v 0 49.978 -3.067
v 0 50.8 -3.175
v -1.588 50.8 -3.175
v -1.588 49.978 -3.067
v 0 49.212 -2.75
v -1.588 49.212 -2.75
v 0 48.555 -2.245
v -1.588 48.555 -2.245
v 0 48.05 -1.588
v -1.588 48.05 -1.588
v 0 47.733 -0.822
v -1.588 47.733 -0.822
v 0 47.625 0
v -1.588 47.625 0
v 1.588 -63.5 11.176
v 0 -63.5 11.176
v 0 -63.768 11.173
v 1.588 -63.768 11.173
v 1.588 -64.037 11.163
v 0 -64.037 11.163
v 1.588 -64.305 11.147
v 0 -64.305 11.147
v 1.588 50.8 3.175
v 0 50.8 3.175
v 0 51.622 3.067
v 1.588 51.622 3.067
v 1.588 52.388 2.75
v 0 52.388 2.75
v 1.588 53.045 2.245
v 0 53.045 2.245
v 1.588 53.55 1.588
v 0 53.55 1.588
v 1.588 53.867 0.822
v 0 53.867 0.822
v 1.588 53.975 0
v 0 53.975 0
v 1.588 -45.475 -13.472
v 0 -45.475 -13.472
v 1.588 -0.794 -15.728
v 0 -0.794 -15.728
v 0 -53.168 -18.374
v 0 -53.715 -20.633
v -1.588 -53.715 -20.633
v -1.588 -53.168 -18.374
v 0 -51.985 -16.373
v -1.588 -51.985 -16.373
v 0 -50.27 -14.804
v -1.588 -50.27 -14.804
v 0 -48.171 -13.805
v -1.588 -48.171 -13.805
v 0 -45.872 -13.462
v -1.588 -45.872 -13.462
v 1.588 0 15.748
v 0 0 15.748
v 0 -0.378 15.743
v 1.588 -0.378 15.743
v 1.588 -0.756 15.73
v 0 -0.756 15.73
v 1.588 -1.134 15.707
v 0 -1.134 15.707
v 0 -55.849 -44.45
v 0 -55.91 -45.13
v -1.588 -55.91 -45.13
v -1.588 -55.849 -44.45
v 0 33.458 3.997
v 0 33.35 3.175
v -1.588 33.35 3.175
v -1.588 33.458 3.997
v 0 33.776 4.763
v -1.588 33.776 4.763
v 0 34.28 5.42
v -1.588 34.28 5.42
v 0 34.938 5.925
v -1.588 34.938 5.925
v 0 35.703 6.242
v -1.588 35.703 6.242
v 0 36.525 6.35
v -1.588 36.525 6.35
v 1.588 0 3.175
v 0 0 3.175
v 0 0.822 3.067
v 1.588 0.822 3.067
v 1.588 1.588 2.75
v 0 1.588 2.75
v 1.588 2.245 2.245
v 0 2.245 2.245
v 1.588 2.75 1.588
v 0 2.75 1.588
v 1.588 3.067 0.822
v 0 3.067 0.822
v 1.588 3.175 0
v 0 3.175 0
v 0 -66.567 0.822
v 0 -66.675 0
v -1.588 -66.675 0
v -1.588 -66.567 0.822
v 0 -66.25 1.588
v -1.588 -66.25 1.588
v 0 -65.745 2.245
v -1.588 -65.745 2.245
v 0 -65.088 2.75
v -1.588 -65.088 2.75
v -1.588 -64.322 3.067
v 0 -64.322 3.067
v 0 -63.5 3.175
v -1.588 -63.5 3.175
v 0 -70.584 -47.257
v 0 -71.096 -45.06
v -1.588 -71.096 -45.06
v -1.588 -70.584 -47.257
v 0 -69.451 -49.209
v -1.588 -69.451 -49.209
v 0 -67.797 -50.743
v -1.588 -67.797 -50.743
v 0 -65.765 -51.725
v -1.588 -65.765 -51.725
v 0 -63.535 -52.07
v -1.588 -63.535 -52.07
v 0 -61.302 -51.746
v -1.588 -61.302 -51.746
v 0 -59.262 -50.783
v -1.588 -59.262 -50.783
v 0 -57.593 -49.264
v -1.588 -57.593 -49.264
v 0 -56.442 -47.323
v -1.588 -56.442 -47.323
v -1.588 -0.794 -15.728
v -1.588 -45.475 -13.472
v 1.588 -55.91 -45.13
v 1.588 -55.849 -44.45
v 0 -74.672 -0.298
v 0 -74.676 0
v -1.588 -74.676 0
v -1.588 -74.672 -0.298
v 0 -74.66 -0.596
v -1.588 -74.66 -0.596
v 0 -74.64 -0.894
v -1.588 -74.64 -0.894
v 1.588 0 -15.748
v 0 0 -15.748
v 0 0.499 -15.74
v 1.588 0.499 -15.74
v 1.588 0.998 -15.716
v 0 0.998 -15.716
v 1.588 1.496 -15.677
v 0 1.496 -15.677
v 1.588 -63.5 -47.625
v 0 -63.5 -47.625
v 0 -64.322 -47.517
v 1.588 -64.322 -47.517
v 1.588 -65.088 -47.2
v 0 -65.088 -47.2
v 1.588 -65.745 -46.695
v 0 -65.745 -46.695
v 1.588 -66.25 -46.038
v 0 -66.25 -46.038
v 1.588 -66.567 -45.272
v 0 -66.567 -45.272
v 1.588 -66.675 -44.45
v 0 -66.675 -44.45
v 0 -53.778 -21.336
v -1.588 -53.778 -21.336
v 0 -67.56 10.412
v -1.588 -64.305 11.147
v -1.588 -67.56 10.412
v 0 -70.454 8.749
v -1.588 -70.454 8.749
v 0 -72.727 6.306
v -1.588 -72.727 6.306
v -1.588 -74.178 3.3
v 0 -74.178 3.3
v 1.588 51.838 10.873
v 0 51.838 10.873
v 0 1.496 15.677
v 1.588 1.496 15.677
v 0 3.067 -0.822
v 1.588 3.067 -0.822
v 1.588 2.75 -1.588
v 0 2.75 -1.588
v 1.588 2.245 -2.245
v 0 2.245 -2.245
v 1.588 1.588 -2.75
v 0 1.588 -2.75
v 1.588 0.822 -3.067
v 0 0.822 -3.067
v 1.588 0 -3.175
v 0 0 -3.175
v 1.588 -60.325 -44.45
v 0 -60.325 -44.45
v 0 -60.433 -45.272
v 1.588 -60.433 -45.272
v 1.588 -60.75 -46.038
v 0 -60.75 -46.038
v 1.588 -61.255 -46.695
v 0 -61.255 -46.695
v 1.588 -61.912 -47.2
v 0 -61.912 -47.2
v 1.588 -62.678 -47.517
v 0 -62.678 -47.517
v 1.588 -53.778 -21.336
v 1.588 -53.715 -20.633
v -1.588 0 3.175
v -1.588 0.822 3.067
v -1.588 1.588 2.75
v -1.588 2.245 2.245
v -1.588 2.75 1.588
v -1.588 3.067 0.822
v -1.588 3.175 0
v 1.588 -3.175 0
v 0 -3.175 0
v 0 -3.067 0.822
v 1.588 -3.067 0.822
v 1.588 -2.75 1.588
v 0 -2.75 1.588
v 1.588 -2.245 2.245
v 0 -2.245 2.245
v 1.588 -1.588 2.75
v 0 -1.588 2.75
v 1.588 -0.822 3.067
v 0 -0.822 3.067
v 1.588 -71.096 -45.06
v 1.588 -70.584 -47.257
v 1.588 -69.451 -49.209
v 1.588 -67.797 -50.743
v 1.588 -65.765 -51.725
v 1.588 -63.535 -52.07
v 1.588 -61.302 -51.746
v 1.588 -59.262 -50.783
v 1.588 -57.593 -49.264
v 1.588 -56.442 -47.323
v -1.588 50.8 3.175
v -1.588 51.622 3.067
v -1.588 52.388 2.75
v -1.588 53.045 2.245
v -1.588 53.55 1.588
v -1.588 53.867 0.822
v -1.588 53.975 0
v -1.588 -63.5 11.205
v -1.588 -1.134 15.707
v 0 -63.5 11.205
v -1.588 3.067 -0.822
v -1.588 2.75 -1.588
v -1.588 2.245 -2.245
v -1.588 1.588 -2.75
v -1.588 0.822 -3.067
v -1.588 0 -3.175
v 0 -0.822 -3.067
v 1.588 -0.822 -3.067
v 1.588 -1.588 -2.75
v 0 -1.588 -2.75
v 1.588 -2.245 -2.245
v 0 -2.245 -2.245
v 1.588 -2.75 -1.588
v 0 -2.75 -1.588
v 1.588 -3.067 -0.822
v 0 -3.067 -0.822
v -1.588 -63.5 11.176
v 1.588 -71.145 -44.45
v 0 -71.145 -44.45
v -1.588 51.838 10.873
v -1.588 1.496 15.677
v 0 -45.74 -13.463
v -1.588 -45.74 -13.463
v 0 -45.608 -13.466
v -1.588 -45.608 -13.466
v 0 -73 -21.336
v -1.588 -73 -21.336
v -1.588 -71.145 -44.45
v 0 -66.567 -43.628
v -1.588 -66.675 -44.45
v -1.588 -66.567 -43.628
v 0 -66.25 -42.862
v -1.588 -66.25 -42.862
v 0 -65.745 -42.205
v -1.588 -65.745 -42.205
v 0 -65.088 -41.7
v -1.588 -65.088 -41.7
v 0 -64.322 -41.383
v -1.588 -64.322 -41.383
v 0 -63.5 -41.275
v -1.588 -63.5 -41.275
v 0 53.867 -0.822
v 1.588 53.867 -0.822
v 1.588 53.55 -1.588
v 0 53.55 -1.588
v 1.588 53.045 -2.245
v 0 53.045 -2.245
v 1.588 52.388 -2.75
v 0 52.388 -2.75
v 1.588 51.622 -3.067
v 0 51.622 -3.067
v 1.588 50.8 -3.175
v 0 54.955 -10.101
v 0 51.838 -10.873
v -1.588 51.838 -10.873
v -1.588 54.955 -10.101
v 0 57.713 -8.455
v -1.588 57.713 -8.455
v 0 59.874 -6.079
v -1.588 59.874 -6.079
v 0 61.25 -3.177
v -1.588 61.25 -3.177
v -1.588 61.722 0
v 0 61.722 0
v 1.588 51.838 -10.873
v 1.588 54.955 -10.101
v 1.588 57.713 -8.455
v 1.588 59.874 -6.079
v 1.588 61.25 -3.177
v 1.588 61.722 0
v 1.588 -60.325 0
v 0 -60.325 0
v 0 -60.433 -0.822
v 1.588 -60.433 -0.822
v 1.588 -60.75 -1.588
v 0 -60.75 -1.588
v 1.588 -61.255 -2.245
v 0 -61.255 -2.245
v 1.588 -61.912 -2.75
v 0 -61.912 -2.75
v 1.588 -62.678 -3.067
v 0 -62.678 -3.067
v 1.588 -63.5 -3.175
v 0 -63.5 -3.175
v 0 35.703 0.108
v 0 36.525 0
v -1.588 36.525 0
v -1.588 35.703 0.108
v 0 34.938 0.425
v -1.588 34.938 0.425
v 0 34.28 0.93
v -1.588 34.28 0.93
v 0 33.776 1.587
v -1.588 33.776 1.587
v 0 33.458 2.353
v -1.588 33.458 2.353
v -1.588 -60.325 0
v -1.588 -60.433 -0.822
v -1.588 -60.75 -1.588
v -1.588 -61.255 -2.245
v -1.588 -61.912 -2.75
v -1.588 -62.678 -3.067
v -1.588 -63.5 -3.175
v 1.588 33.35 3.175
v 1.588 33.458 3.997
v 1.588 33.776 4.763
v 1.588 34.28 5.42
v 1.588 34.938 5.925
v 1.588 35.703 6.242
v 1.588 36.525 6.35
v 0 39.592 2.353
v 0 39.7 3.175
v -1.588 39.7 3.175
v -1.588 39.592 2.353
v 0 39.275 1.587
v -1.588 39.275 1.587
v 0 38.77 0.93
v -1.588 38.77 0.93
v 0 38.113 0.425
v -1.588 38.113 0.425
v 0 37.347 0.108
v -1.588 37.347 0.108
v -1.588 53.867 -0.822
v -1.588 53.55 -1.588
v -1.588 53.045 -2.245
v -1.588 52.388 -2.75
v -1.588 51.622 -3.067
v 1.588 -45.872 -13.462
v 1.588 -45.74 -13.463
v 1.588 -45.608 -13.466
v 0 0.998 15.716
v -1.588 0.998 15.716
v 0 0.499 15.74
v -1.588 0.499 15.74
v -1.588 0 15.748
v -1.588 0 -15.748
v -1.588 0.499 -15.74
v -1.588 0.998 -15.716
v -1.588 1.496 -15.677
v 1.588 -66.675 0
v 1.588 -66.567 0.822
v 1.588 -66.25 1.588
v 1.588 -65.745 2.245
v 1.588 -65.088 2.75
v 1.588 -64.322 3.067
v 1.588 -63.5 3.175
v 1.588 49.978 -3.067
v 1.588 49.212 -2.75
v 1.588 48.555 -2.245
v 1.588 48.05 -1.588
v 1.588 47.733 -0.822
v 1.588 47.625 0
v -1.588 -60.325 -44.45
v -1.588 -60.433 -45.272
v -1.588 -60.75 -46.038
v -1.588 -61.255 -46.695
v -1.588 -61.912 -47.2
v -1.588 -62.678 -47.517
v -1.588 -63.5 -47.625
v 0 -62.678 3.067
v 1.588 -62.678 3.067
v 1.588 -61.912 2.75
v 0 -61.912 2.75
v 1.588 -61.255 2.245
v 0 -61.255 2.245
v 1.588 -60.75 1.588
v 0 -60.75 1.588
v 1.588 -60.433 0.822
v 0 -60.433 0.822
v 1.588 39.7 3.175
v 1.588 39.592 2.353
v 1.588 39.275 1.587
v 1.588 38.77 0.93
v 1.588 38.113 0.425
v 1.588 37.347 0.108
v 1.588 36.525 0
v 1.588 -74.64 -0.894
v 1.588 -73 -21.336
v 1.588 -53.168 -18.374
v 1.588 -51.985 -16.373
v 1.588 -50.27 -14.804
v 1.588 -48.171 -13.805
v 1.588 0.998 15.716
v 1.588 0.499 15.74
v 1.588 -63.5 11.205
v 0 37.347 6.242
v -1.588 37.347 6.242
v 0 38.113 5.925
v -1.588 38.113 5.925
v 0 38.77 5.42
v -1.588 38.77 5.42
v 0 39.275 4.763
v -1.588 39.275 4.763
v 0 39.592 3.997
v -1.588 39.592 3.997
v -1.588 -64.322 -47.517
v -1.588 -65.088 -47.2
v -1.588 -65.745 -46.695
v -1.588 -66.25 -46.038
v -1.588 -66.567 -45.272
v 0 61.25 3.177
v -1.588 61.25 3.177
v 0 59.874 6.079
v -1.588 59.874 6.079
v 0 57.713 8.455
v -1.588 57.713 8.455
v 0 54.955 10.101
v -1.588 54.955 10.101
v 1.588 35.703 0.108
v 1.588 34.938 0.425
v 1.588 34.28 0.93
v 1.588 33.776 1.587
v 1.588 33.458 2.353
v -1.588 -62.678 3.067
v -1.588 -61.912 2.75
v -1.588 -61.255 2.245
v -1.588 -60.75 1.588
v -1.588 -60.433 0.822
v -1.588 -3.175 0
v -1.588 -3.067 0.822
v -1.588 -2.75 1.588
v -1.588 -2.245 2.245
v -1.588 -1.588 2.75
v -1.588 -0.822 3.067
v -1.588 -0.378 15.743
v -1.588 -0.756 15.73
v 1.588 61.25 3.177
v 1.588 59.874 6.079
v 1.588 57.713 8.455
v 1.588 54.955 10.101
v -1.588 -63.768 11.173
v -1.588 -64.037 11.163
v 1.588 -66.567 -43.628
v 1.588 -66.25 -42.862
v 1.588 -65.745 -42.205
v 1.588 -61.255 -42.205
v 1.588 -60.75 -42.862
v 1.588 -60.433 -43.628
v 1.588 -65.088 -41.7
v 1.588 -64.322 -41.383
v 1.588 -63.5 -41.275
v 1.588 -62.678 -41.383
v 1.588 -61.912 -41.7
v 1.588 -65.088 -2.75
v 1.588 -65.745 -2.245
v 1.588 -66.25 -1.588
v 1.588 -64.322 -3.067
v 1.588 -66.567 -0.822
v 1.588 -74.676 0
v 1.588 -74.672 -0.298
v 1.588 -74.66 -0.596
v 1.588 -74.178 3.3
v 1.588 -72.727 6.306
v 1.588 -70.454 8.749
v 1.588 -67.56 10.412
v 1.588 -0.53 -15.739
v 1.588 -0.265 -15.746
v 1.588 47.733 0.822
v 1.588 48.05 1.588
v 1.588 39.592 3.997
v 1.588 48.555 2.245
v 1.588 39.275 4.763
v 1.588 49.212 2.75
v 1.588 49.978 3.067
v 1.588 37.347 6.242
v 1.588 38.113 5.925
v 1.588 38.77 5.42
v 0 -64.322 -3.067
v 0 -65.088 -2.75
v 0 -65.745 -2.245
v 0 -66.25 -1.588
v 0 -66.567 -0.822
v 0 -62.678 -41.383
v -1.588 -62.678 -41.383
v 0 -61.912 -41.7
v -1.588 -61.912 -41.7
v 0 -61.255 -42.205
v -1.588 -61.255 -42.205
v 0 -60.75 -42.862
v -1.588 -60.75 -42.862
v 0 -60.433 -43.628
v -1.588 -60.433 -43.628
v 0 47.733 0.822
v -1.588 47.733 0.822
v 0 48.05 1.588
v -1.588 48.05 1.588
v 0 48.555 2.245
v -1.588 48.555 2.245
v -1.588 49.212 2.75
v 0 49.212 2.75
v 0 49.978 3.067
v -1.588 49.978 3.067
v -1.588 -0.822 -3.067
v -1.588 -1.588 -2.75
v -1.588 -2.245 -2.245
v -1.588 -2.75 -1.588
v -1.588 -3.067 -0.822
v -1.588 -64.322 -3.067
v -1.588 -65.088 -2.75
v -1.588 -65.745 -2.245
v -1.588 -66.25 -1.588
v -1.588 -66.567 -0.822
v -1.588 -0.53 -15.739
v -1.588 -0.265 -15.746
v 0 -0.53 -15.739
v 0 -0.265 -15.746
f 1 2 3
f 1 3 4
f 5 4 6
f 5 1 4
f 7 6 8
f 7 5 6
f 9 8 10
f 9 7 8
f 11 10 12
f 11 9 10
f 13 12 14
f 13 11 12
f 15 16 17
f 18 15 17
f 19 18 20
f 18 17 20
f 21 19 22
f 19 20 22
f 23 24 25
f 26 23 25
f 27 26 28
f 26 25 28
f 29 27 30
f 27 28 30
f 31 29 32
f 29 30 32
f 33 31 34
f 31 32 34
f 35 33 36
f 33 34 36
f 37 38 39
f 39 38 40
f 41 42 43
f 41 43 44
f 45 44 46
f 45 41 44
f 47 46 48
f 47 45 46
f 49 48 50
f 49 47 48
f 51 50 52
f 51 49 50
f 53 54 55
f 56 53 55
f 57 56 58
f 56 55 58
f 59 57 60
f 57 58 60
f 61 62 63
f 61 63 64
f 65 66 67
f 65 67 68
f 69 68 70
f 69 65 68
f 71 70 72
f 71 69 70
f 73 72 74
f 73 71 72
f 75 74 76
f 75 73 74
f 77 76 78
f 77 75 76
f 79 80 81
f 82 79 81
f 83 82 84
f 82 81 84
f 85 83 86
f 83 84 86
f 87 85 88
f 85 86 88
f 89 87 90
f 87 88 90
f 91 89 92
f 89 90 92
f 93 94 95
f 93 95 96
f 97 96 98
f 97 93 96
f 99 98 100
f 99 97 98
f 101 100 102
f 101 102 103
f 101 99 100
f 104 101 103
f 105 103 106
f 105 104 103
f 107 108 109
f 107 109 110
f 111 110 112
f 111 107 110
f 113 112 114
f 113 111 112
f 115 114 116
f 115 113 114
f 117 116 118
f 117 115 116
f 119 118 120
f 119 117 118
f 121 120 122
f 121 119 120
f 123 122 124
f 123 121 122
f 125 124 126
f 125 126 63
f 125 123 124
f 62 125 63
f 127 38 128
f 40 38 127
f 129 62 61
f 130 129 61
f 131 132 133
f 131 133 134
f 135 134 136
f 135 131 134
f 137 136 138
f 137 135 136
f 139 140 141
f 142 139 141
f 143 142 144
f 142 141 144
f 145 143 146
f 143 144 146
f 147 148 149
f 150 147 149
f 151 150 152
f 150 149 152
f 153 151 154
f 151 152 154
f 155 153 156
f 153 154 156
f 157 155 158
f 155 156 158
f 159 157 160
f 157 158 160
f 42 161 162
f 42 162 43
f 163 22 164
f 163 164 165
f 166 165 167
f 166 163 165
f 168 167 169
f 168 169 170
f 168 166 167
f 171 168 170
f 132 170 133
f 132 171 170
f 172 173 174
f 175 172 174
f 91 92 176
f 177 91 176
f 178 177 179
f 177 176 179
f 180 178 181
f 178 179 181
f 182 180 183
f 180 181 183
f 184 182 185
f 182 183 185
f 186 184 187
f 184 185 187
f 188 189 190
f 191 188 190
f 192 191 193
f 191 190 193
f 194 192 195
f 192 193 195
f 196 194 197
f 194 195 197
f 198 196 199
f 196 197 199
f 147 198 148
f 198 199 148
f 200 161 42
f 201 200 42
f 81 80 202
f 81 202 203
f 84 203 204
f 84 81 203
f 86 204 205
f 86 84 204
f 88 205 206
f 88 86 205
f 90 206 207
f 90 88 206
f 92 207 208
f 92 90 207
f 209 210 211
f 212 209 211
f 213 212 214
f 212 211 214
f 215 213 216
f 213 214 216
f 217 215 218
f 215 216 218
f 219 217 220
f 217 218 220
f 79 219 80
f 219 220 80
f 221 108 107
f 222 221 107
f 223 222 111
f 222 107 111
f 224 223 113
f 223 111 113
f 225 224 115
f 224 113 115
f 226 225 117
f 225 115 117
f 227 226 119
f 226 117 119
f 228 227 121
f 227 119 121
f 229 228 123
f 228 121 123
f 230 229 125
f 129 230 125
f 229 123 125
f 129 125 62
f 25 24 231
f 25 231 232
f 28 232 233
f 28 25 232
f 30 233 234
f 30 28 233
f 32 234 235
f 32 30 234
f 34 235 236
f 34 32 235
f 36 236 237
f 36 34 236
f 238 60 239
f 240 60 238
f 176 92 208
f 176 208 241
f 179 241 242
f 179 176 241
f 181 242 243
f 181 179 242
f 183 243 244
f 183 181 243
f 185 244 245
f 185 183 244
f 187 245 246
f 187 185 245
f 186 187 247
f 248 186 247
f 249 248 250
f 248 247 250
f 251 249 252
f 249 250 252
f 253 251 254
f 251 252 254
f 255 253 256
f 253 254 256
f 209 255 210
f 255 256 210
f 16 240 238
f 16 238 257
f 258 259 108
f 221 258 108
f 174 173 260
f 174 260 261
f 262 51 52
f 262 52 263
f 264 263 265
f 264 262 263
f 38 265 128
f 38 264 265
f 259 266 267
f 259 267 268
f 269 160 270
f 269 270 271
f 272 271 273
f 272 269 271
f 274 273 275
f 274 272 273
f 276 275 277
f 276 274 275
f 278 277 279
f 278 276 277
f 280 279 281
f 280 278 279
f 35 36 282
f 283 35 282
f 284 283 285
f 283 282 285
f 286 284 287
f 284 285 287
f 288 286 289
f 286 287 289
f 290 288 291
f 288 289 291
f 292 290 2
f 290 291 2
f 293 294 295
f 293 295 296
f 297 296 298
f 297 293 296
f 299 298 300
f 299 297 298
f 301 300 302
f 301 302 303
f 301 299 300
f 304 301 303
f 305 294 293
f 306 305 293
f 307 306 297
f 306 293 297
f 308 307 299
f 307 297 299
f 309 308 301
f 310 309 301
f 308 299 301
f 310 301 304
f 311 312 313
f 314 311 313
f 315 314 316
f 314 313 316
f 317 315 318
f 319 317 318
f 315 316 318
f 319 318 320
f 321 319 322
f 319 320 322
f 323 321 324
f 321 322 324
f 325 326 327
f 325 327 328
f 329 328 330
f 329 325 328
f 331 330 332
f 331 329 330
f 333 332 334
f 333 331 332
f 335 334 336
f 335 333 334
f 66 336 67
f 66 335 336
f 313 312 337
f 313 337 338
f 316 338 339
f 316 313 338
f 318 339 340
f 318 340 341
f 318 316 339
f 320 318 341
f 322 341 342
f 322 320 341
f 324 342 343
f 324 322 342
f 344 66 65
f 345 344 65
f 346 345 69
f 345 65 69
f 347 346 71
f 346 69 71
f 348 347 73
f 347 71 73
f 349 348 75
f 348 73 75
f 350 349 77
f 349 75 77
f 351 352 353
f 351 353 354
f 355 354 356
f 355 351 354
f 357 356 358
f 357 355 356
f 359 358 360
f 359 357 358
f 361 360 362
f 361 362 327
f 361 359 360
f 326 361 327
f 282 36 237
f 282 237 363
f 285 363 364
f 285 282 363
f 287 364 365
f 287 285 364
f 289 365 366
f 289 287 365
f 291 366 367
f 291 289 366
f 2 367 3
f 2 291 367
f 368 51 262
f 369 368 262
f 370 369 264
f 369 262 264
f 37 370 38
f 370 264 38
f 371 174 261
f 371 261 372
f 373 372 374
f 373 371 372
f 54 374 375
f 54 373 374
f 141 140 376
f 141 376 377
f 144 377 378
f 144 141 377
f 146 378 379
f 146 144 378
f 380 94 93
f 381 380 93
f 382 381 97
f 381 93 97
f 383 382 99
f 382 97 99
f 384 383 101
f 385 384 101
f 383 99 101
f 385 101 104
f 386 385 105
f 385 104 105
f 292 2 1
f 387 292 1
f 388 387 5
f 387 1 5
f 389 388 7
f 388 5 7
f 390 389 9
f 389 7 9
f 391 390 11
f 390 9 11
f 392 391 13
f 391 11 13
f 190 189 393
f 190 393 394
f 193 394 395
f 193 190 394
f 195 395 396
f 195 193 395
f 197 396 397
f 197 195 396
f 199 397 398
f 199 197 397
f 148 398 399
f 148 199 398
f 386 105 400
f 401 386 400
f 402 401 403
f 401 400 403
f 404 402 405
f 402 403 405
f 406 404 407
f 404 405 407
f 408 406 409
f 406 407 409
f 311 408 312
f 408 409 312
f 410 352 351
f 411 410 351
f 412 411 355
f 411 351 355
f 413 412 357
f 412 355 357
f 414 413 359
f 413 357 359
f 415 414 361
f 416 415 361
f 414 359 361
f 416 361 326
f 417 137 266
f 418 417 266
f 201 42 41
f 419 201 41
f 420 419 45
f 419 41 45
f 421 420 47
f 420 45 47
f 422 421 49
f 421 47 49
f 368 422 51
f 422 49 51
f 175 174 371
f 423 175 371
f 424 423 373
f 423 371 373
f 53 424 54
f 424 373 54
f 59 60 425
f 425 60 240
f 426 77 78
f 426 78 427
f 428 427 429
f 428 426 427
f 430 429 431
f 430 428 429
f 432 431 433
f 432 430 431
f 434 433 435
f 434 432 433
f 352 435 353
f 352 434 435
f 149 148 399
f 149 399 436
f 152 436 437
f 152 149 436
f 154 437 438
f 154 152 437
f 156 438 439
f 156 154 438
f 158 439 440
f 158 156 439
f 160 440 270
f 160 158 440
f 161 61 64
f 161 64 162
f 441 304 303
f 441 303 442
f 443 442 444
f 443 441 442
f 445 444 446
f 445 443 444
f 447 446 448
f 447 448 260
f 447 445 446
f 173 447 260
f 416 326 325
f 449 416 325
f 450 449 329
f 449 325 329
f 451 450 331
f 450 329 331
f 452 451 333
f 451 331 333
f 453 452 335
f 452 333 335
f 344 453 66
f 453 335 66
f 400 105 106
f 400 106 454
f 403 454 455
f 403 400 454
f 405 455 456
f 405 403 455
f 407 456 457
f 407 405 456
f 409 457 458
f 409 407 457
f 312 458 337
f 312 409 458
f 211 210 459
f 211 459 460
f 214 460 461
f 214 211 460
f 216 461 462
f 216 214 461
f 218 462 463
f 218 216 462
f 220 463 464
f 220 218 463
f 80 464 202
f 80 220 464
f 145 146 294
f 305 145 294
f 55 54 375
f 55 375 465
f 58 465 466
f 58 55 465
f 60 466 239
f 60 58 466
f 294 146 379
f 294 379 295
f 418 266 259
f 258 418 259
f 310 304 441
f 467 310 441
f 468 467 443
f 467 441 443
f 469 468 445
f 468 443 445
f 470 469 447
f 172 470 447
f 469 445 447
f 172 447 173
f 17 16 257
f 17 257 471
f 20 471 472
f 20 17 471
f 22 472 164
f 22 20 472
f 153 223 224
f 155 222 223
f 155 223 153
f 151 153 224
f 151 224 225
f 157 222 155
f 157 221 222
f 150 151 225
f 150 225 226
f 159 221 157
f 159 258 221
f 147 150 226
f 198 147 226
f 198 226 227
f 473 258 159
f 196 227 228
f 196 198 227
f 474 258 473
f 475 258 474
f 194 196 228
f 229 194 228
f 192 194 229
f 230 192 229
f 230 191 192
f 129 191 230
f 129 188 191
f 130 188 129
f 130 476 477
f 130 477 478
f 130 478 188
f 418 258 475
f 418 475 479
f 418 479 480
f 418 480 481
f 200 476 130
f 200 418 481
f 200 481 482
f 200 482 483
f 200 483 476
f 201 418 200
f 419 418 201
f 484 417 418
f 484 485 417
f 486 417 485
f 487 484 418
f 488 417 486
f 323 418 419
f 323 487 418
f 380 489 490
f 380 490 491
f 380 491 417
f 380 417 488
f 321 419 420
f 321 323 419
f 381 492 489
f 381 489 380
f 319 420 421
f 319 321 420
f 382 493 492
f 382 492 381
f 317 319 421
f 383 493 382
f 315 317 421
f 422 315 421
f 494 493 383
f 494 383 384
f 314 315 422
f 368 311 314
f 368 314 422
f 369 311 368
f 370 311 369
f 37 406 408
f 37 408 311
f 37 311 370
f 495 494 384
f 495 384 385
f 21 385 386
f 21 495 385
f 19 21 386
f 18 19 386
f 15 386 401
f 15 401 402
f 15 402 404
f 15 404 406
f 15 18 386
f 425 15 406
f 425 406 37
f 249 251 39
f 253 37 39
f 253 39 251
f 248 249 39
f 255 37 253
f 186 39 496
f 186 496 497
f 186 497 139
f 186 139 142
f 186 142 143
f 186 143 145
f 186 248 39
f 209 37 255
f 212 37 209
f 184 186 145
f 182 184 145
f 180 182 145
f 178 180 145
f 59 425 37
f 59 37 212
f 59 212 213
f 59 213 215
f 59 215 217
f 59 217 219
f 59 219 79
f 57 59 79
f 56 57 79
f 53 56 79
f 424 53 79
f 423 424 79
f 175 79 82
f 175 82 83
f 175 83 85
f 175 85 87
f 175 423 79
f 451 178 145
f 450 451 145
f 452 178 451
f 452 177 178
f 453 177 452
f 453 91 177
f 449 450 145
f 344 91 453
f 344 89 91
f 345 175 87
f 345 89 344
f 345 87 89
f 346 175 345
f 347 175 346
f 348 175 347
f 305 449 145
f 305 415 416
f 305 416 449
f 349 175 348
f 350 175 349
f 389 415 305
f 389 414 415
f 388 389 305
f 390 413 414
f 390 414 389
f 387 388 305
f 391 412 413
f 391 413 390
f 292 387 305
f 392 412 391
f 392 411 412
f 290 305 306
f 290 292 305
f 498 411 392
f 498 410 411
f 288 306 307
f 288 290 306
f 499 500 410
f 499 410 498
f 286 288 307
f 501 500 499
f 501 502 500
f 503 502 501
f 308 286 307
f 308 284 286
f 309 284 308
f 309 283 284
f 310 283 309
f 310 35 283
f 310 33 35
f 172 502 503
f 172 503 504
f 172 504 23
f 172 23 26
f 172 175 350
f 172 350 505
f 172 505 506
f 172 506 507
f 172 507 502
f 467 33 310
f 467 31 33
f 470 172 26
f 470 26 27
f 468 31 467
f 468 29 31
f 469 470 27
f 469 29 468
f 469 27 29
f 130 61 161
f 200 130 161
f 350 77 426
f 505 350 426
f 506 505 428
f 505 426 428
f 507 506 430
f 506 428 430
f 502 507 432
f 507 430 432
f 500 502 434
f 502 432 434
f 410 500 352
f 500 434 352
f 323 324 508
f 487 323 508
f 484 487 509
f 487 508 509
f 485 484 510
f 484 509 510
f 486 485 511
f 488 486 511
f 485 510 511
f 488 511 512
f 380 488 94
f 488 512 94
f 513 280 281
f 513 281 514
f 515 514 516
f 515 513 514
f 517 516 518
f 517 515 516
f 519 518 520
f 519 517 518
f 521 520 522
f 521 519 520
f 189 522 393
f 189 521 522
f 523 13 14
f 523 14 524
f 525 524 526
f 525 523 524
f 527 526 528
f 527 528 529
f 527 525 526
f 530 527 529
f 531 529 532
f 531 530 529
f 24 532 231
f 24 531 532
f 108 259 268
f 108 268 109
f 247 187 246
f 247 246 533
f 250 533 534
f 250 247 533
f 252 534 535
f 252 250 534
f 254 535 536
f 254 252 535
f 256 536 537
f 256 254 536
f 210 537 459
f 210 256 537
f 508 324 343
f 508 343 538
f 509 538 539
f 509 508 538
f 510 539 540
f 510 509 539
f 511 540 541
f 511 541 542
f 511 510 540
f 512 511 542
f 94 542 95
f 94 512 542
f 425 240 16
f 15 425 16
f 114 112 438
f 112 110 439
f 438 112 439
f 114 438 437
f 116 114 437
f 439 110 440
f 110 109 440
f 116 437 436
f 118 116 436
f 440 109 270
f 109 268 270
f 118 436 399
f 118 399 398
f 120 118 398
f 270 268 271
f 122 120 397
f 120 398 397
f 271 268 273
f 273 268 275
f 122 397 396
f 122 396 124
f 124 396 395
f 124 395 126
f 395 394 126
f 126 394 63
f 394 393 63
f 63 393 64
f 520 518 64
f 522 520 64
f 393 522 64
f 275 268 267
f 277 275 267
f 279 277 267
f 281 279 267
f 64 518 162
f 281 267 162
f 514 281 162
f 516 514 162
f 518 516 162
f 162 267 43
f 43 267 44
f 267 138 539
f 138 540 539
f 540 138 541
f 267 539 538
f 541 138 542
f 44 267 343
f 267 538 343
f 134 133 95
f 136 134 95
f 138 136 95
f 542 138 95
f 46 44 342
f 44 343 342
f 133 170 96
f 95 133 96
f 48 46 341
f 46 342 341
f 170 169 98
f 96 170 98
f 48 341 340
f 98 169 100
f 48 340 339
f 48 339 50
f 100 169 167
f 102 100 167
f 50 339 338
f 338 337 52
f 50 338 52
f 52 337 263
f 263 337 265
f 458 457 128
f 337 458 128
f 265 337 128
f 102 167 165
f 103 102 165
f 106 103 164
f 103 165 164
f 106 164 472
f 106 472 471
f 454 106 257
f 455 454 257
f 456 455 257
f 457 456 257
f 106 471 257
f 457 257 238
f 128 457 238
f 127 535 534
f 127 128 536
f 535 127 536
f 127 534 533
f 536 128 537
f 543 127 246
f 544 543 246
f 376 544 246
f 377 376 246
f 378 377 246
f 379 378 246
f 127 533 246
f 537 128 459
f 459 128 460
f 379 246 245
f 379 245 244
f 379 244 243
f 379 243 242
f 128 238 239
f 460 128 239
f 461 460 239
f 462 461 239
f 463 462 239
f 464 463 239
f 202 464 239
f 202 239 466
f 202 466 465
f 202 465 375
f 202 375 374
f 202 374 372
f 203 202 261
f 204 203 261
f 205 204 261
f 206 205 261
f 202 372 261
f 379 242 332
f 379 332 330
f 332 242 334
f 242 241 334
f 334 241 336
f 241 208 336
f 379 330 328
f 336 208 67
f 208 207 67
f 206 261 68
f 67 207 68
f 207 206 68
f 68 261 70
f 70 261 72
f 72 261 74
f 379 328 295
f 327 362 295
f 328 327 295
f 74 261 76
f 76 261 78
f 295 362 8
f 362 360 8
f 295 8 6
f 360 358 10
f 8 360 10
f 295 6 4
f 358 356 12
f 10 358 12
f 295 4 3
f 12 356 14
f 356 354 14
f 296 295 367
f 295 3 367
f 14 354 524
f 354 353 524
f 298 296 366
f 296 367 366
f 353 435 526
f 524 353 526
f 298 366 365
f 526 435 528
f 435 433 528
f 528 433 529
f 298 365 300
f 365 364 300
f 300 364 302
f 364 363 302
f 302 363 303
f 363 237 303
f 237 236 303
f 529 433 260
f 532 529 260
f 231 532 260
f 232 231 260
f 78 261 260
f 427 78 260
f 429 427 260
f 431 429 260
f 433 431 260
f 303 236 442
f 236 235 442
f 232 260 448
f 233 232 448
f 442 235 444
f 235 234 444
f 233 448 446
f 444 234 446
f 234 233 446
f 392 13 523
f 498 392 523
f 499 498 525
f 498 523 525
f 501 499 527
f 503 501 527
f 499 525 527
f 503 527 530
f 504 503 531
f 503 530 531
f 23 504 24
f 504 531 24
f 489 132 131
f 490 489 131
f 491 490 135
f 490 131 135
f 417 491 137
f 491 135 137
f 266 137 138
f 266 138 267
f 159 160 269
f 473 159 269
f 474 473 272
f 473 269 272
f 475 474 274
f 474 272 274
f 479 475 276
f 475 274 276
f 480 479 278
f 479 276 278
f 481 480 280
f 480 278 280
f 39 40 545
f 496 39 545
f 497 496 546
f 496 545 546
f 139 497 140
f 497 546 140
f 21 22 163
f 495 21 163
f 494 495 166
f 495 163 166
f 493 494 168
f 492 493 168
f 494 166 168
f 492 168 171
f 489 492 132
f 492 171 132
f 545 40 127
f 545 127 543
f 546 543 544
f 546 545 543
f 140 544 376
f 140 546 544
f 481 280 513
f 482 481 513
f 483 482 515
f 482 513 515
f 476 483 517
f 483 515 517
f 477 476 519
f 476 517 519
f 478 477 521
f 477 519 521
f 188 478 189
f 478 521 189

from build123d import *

# Parameters (mm, degrees)
F1_DEPTH = 1.5875


with BuildPart() as f1:
    # F0 (on Right) → F1 (new body, symmetric)
    with BuildSketch(Plane.YZ):
        with BuildLine():
            ThreePointArc((0, -3.175), (-2.2450640303, -2.2450640303), (-3.175, 0))
            Line((-3.175, 0), (-45.8724, 0))
            Line((-45.8724, 0), (-45.8724, -13.462))
            ThreePointArc((-45.8724, -13.462), (-45.6738112484, -13.4645046841), (-45.4753488371, -13.4720171431))
            Line((-45.4753488371, -13.4720171431), (-0.7941023258, -15.7279657139))
            ThreePointArc((-0.7941023258, -15.7279657139), (-0.3971775033, -15.7429906317), (0, -15.748))
            Line((0, -15.748), (0, -3.175))
        make_face()
        with BuildLine():
            ThreePointArc((51.83759, -10.8726027699), (58.8815419933, -7.3470240921), (61.722, 0))
            Line((61.722, 0), (53.975, 0))
            ThreePointArc((53.975, 0), (53.0450640303, -2.2450640303), (50.8, -3.175))
            ThreePointArc((50.8, -3.175), (48.5549359697, -2.2450640303), (47.625, 0))
            Line((47.625, 0), (36.5252, 0))
            Line((36.5252, 0), (3.175, 0))
            ThreePointArc((3.175, 0), (2.2450640303, -2.2450640303), (0, -3.175))
            Line((0, -3.175), (0, -15.748))
            ThreePointArc((0, -15.748), (0.7488772211, -15.7301839439), (1.49606, -15.6767760868))
            Line((1.49606, -15.6767760868), (51.83759, -10.8726027699))
        make_face()
        with BuildLine():
            Line((51.83759, 10.8726027699), (1.49606, 15.6767760868))
            ThreePointArc((1.49606, 15.6767760868), (0.7488772211, 15.7301839439), (0, 15.748))
            Line((0, 15.748), (0, 3.175))
            ThreePointArc((0, 3.175), (2.2450640303, 2.2450640303), (3.175, 0))
            Line((3.175, 0), (36.5252, 0))
            Line((36.5252, 0), (47.625, 0))
            ThreePointArc((47.625, 0), (48.5549359697, 2.2450640303), (50.8, 3.175))
            ThreePointArc((50.8, 3.175), (53.0450640303, 2.2450640303), (53.975, 0))
            Line((53.975, 0), (61.722, 0))
            ThreePointArc((61.722, 0), (58.8815419933, 7.3470240921), (51.83759, 10.8726027699))
        make_face()
        with BuildLine():
            ThreePointArc((39.7002, 3.175), (38.7702640303, 0.9299359697), (36.5252, 0))
            ThreePointArc((36.5252, 0), (34.2801359697, 0.9299359697), (33.3502, 3.175))
            ThreePointArc((33.3502, 3.175), (34.2801359697, 5.4200640303), (36.5252, 6.35))
            ThreePointArc((36.5252, 6.35), (38.7702640303, 5.4200640303), (39.7002, 3.175))
        make_face(mode=Mode.SUBTRACT)
        with BuildLine():
            Line((0, 3.175), (0, 15.748))
            ThreePointArc((0, 15.748), (-0.5672962051, 15.7377787192), (-1.133856, 15.7071281452))
            Line((-1.133856, 15.7071281452), (-45.8724, 12.4775710883))
            Line((-45.8724, 12.4775710883), (-45.8724, 0))
            Line((-45.8724, 0), (-3.175, 0))
            ThreePointArc((-3.175, 0), (-2.2450640303, 2.2450640303), (0, 3.175))
        make_face()
        with BuildLine():
            Line((-45.8724, 0), (-45.8724, 12.4775710883))
            Line((-45.8724, 12.4775710883), (-63.5, 11.2050813091))
            Line((-63.5, 11.2050813091), (-63.5, 11.176))
            Line((-63.5, 11.176), (-63.5, 3.175))
            ThreePointArc((-63.5, 3.175), (-61.2549359697, 2.2450640303), (-60.325, 0))
            Line((-60.325, 0), (-45.8724, 0))
        make_face()
        with BuildLine():
            Line((-45.8724, -13.462), (-45.8724, 0))
            Line((-45.8724, 0), (-60.325, 0))
            ThreePointArc((-60.325, 0), (-61.2549359697, -2.2450640303), (-63.5, -3.175))
            Line((-63.5, -3.175), (-63.5, -21.336))
            Line((-63.5, -21.336), (-53.7779584797, -21.336))
            Line((-53.7779584797, -21.336), (-53.7149674997, -20.6331408299))
            ThreePointArc((-53.7149674997, -20.6331408299), (-51.1858528743, -15.5250539021), (-45.8724, -13.462))
        make_face()
        with BuildLine():
            Line((-63.5, -21.336), (-63.5, -3.175))
            ThreePointArc((-63.5, -3.175), (-65.7450640303, -2.2450640303), (-66.675, 0))
            Line((-66.675, 0), (-74.676, 0))
            ThreePointArc((-74.676, 0), (-74.6670412581, -0.4473986372), (-74.640179395, -0.89408))
            Line((-74.640179395, -0.89408), (-72.9995674098, -21.336))
            Line((-72.9995674098, -21.336), (-63.5, -21.336))
        make_face()
        with BuildLine():
            Line((-63.5, 3.175), (-63.5, 11.176))
            ThreePointArc((-63.5, 11.176), (-63.9025973068, 11.1687461878), (-64.304672, 11.1469941676))
            ThreePointArc((-64.304672, 11.1469941676), (-71.6821754525, 7.612816881), (-74.676, 0))
            Line((-74.676, 0), (-66.675, 0))
            ThreePointArc((-66.675, 0), (-65.7450640303, 2.2450640303), (-63.5, 3.175))
        make_face()
        with BuildLine():
            Line((-53.7779584797, -21.336), (-63.5, -21.336))
            Line((-63.5, -21.336), (-63.5, -41.275))
            ThreePointArc((-63.5, -41.275), (-61.2549359697, -42.2049359697), (-60.325, -44.45))
            Line((-60.325, -44.45), (-55.8494595357, -44.45))
            Line((-55.8494595357, -44.45), (-53.7779584797, -21.336))
        make_face()
        with BuildLine():
            Line((-63.5, -41.275), (-63.5, -21.336))
            Line((-63.5, -21.336), (-72.9995674098, -21.336))
            Line((-72.9995674098, -21.336), (-71.1445016709, -44.45))
            Line((-71.1445016709, -44.45), (-66.675, -44.45))
            ThreePointArc((-66.675, -44.45), (-65.7450640303, -42.2049359697), (-63.5, -41.275))
        make_face()
        with BuildLine():
            Line((-55.9104185487, -45.1301862936), (-55.8494595357, -44.45))
            Line((-55.8494595357, -44.45), (-60.325, -44.45))
            ThreePointArc((-60.325, -44.45), (-61.2549359697, -46.6950640303), (-63.5, -47.625))
            Line((-63.5, -47.625), (-63.5, -52.07))
            ThreePointArc((-63.5, -52.07), (-58.3579488313, -50.0734962238), (-55.9104185487, -45.1301862936))
        make_face()
        with BuildLine():
            ThreePointArc((-63.5, -47.625), (-65.7450640303, -46.6950640303), (-66.675, -44.45))
            Line((-66.675, -44.45), (-71.1445016709, -44.45))
            Line((-71.1445016709, -44.45), (-71.0955768603, -45.0596))
            ThreePointArc((-71.0955768603, -45.0596), (-68.6681354471, -50.049533552), (-63.5, -52.07))
            Line((-63.5, -52.07), (-63.5, -47.625))
        make_face()
    extrude(amount=F1_DEPTH, both=True)


solid = f1.part
